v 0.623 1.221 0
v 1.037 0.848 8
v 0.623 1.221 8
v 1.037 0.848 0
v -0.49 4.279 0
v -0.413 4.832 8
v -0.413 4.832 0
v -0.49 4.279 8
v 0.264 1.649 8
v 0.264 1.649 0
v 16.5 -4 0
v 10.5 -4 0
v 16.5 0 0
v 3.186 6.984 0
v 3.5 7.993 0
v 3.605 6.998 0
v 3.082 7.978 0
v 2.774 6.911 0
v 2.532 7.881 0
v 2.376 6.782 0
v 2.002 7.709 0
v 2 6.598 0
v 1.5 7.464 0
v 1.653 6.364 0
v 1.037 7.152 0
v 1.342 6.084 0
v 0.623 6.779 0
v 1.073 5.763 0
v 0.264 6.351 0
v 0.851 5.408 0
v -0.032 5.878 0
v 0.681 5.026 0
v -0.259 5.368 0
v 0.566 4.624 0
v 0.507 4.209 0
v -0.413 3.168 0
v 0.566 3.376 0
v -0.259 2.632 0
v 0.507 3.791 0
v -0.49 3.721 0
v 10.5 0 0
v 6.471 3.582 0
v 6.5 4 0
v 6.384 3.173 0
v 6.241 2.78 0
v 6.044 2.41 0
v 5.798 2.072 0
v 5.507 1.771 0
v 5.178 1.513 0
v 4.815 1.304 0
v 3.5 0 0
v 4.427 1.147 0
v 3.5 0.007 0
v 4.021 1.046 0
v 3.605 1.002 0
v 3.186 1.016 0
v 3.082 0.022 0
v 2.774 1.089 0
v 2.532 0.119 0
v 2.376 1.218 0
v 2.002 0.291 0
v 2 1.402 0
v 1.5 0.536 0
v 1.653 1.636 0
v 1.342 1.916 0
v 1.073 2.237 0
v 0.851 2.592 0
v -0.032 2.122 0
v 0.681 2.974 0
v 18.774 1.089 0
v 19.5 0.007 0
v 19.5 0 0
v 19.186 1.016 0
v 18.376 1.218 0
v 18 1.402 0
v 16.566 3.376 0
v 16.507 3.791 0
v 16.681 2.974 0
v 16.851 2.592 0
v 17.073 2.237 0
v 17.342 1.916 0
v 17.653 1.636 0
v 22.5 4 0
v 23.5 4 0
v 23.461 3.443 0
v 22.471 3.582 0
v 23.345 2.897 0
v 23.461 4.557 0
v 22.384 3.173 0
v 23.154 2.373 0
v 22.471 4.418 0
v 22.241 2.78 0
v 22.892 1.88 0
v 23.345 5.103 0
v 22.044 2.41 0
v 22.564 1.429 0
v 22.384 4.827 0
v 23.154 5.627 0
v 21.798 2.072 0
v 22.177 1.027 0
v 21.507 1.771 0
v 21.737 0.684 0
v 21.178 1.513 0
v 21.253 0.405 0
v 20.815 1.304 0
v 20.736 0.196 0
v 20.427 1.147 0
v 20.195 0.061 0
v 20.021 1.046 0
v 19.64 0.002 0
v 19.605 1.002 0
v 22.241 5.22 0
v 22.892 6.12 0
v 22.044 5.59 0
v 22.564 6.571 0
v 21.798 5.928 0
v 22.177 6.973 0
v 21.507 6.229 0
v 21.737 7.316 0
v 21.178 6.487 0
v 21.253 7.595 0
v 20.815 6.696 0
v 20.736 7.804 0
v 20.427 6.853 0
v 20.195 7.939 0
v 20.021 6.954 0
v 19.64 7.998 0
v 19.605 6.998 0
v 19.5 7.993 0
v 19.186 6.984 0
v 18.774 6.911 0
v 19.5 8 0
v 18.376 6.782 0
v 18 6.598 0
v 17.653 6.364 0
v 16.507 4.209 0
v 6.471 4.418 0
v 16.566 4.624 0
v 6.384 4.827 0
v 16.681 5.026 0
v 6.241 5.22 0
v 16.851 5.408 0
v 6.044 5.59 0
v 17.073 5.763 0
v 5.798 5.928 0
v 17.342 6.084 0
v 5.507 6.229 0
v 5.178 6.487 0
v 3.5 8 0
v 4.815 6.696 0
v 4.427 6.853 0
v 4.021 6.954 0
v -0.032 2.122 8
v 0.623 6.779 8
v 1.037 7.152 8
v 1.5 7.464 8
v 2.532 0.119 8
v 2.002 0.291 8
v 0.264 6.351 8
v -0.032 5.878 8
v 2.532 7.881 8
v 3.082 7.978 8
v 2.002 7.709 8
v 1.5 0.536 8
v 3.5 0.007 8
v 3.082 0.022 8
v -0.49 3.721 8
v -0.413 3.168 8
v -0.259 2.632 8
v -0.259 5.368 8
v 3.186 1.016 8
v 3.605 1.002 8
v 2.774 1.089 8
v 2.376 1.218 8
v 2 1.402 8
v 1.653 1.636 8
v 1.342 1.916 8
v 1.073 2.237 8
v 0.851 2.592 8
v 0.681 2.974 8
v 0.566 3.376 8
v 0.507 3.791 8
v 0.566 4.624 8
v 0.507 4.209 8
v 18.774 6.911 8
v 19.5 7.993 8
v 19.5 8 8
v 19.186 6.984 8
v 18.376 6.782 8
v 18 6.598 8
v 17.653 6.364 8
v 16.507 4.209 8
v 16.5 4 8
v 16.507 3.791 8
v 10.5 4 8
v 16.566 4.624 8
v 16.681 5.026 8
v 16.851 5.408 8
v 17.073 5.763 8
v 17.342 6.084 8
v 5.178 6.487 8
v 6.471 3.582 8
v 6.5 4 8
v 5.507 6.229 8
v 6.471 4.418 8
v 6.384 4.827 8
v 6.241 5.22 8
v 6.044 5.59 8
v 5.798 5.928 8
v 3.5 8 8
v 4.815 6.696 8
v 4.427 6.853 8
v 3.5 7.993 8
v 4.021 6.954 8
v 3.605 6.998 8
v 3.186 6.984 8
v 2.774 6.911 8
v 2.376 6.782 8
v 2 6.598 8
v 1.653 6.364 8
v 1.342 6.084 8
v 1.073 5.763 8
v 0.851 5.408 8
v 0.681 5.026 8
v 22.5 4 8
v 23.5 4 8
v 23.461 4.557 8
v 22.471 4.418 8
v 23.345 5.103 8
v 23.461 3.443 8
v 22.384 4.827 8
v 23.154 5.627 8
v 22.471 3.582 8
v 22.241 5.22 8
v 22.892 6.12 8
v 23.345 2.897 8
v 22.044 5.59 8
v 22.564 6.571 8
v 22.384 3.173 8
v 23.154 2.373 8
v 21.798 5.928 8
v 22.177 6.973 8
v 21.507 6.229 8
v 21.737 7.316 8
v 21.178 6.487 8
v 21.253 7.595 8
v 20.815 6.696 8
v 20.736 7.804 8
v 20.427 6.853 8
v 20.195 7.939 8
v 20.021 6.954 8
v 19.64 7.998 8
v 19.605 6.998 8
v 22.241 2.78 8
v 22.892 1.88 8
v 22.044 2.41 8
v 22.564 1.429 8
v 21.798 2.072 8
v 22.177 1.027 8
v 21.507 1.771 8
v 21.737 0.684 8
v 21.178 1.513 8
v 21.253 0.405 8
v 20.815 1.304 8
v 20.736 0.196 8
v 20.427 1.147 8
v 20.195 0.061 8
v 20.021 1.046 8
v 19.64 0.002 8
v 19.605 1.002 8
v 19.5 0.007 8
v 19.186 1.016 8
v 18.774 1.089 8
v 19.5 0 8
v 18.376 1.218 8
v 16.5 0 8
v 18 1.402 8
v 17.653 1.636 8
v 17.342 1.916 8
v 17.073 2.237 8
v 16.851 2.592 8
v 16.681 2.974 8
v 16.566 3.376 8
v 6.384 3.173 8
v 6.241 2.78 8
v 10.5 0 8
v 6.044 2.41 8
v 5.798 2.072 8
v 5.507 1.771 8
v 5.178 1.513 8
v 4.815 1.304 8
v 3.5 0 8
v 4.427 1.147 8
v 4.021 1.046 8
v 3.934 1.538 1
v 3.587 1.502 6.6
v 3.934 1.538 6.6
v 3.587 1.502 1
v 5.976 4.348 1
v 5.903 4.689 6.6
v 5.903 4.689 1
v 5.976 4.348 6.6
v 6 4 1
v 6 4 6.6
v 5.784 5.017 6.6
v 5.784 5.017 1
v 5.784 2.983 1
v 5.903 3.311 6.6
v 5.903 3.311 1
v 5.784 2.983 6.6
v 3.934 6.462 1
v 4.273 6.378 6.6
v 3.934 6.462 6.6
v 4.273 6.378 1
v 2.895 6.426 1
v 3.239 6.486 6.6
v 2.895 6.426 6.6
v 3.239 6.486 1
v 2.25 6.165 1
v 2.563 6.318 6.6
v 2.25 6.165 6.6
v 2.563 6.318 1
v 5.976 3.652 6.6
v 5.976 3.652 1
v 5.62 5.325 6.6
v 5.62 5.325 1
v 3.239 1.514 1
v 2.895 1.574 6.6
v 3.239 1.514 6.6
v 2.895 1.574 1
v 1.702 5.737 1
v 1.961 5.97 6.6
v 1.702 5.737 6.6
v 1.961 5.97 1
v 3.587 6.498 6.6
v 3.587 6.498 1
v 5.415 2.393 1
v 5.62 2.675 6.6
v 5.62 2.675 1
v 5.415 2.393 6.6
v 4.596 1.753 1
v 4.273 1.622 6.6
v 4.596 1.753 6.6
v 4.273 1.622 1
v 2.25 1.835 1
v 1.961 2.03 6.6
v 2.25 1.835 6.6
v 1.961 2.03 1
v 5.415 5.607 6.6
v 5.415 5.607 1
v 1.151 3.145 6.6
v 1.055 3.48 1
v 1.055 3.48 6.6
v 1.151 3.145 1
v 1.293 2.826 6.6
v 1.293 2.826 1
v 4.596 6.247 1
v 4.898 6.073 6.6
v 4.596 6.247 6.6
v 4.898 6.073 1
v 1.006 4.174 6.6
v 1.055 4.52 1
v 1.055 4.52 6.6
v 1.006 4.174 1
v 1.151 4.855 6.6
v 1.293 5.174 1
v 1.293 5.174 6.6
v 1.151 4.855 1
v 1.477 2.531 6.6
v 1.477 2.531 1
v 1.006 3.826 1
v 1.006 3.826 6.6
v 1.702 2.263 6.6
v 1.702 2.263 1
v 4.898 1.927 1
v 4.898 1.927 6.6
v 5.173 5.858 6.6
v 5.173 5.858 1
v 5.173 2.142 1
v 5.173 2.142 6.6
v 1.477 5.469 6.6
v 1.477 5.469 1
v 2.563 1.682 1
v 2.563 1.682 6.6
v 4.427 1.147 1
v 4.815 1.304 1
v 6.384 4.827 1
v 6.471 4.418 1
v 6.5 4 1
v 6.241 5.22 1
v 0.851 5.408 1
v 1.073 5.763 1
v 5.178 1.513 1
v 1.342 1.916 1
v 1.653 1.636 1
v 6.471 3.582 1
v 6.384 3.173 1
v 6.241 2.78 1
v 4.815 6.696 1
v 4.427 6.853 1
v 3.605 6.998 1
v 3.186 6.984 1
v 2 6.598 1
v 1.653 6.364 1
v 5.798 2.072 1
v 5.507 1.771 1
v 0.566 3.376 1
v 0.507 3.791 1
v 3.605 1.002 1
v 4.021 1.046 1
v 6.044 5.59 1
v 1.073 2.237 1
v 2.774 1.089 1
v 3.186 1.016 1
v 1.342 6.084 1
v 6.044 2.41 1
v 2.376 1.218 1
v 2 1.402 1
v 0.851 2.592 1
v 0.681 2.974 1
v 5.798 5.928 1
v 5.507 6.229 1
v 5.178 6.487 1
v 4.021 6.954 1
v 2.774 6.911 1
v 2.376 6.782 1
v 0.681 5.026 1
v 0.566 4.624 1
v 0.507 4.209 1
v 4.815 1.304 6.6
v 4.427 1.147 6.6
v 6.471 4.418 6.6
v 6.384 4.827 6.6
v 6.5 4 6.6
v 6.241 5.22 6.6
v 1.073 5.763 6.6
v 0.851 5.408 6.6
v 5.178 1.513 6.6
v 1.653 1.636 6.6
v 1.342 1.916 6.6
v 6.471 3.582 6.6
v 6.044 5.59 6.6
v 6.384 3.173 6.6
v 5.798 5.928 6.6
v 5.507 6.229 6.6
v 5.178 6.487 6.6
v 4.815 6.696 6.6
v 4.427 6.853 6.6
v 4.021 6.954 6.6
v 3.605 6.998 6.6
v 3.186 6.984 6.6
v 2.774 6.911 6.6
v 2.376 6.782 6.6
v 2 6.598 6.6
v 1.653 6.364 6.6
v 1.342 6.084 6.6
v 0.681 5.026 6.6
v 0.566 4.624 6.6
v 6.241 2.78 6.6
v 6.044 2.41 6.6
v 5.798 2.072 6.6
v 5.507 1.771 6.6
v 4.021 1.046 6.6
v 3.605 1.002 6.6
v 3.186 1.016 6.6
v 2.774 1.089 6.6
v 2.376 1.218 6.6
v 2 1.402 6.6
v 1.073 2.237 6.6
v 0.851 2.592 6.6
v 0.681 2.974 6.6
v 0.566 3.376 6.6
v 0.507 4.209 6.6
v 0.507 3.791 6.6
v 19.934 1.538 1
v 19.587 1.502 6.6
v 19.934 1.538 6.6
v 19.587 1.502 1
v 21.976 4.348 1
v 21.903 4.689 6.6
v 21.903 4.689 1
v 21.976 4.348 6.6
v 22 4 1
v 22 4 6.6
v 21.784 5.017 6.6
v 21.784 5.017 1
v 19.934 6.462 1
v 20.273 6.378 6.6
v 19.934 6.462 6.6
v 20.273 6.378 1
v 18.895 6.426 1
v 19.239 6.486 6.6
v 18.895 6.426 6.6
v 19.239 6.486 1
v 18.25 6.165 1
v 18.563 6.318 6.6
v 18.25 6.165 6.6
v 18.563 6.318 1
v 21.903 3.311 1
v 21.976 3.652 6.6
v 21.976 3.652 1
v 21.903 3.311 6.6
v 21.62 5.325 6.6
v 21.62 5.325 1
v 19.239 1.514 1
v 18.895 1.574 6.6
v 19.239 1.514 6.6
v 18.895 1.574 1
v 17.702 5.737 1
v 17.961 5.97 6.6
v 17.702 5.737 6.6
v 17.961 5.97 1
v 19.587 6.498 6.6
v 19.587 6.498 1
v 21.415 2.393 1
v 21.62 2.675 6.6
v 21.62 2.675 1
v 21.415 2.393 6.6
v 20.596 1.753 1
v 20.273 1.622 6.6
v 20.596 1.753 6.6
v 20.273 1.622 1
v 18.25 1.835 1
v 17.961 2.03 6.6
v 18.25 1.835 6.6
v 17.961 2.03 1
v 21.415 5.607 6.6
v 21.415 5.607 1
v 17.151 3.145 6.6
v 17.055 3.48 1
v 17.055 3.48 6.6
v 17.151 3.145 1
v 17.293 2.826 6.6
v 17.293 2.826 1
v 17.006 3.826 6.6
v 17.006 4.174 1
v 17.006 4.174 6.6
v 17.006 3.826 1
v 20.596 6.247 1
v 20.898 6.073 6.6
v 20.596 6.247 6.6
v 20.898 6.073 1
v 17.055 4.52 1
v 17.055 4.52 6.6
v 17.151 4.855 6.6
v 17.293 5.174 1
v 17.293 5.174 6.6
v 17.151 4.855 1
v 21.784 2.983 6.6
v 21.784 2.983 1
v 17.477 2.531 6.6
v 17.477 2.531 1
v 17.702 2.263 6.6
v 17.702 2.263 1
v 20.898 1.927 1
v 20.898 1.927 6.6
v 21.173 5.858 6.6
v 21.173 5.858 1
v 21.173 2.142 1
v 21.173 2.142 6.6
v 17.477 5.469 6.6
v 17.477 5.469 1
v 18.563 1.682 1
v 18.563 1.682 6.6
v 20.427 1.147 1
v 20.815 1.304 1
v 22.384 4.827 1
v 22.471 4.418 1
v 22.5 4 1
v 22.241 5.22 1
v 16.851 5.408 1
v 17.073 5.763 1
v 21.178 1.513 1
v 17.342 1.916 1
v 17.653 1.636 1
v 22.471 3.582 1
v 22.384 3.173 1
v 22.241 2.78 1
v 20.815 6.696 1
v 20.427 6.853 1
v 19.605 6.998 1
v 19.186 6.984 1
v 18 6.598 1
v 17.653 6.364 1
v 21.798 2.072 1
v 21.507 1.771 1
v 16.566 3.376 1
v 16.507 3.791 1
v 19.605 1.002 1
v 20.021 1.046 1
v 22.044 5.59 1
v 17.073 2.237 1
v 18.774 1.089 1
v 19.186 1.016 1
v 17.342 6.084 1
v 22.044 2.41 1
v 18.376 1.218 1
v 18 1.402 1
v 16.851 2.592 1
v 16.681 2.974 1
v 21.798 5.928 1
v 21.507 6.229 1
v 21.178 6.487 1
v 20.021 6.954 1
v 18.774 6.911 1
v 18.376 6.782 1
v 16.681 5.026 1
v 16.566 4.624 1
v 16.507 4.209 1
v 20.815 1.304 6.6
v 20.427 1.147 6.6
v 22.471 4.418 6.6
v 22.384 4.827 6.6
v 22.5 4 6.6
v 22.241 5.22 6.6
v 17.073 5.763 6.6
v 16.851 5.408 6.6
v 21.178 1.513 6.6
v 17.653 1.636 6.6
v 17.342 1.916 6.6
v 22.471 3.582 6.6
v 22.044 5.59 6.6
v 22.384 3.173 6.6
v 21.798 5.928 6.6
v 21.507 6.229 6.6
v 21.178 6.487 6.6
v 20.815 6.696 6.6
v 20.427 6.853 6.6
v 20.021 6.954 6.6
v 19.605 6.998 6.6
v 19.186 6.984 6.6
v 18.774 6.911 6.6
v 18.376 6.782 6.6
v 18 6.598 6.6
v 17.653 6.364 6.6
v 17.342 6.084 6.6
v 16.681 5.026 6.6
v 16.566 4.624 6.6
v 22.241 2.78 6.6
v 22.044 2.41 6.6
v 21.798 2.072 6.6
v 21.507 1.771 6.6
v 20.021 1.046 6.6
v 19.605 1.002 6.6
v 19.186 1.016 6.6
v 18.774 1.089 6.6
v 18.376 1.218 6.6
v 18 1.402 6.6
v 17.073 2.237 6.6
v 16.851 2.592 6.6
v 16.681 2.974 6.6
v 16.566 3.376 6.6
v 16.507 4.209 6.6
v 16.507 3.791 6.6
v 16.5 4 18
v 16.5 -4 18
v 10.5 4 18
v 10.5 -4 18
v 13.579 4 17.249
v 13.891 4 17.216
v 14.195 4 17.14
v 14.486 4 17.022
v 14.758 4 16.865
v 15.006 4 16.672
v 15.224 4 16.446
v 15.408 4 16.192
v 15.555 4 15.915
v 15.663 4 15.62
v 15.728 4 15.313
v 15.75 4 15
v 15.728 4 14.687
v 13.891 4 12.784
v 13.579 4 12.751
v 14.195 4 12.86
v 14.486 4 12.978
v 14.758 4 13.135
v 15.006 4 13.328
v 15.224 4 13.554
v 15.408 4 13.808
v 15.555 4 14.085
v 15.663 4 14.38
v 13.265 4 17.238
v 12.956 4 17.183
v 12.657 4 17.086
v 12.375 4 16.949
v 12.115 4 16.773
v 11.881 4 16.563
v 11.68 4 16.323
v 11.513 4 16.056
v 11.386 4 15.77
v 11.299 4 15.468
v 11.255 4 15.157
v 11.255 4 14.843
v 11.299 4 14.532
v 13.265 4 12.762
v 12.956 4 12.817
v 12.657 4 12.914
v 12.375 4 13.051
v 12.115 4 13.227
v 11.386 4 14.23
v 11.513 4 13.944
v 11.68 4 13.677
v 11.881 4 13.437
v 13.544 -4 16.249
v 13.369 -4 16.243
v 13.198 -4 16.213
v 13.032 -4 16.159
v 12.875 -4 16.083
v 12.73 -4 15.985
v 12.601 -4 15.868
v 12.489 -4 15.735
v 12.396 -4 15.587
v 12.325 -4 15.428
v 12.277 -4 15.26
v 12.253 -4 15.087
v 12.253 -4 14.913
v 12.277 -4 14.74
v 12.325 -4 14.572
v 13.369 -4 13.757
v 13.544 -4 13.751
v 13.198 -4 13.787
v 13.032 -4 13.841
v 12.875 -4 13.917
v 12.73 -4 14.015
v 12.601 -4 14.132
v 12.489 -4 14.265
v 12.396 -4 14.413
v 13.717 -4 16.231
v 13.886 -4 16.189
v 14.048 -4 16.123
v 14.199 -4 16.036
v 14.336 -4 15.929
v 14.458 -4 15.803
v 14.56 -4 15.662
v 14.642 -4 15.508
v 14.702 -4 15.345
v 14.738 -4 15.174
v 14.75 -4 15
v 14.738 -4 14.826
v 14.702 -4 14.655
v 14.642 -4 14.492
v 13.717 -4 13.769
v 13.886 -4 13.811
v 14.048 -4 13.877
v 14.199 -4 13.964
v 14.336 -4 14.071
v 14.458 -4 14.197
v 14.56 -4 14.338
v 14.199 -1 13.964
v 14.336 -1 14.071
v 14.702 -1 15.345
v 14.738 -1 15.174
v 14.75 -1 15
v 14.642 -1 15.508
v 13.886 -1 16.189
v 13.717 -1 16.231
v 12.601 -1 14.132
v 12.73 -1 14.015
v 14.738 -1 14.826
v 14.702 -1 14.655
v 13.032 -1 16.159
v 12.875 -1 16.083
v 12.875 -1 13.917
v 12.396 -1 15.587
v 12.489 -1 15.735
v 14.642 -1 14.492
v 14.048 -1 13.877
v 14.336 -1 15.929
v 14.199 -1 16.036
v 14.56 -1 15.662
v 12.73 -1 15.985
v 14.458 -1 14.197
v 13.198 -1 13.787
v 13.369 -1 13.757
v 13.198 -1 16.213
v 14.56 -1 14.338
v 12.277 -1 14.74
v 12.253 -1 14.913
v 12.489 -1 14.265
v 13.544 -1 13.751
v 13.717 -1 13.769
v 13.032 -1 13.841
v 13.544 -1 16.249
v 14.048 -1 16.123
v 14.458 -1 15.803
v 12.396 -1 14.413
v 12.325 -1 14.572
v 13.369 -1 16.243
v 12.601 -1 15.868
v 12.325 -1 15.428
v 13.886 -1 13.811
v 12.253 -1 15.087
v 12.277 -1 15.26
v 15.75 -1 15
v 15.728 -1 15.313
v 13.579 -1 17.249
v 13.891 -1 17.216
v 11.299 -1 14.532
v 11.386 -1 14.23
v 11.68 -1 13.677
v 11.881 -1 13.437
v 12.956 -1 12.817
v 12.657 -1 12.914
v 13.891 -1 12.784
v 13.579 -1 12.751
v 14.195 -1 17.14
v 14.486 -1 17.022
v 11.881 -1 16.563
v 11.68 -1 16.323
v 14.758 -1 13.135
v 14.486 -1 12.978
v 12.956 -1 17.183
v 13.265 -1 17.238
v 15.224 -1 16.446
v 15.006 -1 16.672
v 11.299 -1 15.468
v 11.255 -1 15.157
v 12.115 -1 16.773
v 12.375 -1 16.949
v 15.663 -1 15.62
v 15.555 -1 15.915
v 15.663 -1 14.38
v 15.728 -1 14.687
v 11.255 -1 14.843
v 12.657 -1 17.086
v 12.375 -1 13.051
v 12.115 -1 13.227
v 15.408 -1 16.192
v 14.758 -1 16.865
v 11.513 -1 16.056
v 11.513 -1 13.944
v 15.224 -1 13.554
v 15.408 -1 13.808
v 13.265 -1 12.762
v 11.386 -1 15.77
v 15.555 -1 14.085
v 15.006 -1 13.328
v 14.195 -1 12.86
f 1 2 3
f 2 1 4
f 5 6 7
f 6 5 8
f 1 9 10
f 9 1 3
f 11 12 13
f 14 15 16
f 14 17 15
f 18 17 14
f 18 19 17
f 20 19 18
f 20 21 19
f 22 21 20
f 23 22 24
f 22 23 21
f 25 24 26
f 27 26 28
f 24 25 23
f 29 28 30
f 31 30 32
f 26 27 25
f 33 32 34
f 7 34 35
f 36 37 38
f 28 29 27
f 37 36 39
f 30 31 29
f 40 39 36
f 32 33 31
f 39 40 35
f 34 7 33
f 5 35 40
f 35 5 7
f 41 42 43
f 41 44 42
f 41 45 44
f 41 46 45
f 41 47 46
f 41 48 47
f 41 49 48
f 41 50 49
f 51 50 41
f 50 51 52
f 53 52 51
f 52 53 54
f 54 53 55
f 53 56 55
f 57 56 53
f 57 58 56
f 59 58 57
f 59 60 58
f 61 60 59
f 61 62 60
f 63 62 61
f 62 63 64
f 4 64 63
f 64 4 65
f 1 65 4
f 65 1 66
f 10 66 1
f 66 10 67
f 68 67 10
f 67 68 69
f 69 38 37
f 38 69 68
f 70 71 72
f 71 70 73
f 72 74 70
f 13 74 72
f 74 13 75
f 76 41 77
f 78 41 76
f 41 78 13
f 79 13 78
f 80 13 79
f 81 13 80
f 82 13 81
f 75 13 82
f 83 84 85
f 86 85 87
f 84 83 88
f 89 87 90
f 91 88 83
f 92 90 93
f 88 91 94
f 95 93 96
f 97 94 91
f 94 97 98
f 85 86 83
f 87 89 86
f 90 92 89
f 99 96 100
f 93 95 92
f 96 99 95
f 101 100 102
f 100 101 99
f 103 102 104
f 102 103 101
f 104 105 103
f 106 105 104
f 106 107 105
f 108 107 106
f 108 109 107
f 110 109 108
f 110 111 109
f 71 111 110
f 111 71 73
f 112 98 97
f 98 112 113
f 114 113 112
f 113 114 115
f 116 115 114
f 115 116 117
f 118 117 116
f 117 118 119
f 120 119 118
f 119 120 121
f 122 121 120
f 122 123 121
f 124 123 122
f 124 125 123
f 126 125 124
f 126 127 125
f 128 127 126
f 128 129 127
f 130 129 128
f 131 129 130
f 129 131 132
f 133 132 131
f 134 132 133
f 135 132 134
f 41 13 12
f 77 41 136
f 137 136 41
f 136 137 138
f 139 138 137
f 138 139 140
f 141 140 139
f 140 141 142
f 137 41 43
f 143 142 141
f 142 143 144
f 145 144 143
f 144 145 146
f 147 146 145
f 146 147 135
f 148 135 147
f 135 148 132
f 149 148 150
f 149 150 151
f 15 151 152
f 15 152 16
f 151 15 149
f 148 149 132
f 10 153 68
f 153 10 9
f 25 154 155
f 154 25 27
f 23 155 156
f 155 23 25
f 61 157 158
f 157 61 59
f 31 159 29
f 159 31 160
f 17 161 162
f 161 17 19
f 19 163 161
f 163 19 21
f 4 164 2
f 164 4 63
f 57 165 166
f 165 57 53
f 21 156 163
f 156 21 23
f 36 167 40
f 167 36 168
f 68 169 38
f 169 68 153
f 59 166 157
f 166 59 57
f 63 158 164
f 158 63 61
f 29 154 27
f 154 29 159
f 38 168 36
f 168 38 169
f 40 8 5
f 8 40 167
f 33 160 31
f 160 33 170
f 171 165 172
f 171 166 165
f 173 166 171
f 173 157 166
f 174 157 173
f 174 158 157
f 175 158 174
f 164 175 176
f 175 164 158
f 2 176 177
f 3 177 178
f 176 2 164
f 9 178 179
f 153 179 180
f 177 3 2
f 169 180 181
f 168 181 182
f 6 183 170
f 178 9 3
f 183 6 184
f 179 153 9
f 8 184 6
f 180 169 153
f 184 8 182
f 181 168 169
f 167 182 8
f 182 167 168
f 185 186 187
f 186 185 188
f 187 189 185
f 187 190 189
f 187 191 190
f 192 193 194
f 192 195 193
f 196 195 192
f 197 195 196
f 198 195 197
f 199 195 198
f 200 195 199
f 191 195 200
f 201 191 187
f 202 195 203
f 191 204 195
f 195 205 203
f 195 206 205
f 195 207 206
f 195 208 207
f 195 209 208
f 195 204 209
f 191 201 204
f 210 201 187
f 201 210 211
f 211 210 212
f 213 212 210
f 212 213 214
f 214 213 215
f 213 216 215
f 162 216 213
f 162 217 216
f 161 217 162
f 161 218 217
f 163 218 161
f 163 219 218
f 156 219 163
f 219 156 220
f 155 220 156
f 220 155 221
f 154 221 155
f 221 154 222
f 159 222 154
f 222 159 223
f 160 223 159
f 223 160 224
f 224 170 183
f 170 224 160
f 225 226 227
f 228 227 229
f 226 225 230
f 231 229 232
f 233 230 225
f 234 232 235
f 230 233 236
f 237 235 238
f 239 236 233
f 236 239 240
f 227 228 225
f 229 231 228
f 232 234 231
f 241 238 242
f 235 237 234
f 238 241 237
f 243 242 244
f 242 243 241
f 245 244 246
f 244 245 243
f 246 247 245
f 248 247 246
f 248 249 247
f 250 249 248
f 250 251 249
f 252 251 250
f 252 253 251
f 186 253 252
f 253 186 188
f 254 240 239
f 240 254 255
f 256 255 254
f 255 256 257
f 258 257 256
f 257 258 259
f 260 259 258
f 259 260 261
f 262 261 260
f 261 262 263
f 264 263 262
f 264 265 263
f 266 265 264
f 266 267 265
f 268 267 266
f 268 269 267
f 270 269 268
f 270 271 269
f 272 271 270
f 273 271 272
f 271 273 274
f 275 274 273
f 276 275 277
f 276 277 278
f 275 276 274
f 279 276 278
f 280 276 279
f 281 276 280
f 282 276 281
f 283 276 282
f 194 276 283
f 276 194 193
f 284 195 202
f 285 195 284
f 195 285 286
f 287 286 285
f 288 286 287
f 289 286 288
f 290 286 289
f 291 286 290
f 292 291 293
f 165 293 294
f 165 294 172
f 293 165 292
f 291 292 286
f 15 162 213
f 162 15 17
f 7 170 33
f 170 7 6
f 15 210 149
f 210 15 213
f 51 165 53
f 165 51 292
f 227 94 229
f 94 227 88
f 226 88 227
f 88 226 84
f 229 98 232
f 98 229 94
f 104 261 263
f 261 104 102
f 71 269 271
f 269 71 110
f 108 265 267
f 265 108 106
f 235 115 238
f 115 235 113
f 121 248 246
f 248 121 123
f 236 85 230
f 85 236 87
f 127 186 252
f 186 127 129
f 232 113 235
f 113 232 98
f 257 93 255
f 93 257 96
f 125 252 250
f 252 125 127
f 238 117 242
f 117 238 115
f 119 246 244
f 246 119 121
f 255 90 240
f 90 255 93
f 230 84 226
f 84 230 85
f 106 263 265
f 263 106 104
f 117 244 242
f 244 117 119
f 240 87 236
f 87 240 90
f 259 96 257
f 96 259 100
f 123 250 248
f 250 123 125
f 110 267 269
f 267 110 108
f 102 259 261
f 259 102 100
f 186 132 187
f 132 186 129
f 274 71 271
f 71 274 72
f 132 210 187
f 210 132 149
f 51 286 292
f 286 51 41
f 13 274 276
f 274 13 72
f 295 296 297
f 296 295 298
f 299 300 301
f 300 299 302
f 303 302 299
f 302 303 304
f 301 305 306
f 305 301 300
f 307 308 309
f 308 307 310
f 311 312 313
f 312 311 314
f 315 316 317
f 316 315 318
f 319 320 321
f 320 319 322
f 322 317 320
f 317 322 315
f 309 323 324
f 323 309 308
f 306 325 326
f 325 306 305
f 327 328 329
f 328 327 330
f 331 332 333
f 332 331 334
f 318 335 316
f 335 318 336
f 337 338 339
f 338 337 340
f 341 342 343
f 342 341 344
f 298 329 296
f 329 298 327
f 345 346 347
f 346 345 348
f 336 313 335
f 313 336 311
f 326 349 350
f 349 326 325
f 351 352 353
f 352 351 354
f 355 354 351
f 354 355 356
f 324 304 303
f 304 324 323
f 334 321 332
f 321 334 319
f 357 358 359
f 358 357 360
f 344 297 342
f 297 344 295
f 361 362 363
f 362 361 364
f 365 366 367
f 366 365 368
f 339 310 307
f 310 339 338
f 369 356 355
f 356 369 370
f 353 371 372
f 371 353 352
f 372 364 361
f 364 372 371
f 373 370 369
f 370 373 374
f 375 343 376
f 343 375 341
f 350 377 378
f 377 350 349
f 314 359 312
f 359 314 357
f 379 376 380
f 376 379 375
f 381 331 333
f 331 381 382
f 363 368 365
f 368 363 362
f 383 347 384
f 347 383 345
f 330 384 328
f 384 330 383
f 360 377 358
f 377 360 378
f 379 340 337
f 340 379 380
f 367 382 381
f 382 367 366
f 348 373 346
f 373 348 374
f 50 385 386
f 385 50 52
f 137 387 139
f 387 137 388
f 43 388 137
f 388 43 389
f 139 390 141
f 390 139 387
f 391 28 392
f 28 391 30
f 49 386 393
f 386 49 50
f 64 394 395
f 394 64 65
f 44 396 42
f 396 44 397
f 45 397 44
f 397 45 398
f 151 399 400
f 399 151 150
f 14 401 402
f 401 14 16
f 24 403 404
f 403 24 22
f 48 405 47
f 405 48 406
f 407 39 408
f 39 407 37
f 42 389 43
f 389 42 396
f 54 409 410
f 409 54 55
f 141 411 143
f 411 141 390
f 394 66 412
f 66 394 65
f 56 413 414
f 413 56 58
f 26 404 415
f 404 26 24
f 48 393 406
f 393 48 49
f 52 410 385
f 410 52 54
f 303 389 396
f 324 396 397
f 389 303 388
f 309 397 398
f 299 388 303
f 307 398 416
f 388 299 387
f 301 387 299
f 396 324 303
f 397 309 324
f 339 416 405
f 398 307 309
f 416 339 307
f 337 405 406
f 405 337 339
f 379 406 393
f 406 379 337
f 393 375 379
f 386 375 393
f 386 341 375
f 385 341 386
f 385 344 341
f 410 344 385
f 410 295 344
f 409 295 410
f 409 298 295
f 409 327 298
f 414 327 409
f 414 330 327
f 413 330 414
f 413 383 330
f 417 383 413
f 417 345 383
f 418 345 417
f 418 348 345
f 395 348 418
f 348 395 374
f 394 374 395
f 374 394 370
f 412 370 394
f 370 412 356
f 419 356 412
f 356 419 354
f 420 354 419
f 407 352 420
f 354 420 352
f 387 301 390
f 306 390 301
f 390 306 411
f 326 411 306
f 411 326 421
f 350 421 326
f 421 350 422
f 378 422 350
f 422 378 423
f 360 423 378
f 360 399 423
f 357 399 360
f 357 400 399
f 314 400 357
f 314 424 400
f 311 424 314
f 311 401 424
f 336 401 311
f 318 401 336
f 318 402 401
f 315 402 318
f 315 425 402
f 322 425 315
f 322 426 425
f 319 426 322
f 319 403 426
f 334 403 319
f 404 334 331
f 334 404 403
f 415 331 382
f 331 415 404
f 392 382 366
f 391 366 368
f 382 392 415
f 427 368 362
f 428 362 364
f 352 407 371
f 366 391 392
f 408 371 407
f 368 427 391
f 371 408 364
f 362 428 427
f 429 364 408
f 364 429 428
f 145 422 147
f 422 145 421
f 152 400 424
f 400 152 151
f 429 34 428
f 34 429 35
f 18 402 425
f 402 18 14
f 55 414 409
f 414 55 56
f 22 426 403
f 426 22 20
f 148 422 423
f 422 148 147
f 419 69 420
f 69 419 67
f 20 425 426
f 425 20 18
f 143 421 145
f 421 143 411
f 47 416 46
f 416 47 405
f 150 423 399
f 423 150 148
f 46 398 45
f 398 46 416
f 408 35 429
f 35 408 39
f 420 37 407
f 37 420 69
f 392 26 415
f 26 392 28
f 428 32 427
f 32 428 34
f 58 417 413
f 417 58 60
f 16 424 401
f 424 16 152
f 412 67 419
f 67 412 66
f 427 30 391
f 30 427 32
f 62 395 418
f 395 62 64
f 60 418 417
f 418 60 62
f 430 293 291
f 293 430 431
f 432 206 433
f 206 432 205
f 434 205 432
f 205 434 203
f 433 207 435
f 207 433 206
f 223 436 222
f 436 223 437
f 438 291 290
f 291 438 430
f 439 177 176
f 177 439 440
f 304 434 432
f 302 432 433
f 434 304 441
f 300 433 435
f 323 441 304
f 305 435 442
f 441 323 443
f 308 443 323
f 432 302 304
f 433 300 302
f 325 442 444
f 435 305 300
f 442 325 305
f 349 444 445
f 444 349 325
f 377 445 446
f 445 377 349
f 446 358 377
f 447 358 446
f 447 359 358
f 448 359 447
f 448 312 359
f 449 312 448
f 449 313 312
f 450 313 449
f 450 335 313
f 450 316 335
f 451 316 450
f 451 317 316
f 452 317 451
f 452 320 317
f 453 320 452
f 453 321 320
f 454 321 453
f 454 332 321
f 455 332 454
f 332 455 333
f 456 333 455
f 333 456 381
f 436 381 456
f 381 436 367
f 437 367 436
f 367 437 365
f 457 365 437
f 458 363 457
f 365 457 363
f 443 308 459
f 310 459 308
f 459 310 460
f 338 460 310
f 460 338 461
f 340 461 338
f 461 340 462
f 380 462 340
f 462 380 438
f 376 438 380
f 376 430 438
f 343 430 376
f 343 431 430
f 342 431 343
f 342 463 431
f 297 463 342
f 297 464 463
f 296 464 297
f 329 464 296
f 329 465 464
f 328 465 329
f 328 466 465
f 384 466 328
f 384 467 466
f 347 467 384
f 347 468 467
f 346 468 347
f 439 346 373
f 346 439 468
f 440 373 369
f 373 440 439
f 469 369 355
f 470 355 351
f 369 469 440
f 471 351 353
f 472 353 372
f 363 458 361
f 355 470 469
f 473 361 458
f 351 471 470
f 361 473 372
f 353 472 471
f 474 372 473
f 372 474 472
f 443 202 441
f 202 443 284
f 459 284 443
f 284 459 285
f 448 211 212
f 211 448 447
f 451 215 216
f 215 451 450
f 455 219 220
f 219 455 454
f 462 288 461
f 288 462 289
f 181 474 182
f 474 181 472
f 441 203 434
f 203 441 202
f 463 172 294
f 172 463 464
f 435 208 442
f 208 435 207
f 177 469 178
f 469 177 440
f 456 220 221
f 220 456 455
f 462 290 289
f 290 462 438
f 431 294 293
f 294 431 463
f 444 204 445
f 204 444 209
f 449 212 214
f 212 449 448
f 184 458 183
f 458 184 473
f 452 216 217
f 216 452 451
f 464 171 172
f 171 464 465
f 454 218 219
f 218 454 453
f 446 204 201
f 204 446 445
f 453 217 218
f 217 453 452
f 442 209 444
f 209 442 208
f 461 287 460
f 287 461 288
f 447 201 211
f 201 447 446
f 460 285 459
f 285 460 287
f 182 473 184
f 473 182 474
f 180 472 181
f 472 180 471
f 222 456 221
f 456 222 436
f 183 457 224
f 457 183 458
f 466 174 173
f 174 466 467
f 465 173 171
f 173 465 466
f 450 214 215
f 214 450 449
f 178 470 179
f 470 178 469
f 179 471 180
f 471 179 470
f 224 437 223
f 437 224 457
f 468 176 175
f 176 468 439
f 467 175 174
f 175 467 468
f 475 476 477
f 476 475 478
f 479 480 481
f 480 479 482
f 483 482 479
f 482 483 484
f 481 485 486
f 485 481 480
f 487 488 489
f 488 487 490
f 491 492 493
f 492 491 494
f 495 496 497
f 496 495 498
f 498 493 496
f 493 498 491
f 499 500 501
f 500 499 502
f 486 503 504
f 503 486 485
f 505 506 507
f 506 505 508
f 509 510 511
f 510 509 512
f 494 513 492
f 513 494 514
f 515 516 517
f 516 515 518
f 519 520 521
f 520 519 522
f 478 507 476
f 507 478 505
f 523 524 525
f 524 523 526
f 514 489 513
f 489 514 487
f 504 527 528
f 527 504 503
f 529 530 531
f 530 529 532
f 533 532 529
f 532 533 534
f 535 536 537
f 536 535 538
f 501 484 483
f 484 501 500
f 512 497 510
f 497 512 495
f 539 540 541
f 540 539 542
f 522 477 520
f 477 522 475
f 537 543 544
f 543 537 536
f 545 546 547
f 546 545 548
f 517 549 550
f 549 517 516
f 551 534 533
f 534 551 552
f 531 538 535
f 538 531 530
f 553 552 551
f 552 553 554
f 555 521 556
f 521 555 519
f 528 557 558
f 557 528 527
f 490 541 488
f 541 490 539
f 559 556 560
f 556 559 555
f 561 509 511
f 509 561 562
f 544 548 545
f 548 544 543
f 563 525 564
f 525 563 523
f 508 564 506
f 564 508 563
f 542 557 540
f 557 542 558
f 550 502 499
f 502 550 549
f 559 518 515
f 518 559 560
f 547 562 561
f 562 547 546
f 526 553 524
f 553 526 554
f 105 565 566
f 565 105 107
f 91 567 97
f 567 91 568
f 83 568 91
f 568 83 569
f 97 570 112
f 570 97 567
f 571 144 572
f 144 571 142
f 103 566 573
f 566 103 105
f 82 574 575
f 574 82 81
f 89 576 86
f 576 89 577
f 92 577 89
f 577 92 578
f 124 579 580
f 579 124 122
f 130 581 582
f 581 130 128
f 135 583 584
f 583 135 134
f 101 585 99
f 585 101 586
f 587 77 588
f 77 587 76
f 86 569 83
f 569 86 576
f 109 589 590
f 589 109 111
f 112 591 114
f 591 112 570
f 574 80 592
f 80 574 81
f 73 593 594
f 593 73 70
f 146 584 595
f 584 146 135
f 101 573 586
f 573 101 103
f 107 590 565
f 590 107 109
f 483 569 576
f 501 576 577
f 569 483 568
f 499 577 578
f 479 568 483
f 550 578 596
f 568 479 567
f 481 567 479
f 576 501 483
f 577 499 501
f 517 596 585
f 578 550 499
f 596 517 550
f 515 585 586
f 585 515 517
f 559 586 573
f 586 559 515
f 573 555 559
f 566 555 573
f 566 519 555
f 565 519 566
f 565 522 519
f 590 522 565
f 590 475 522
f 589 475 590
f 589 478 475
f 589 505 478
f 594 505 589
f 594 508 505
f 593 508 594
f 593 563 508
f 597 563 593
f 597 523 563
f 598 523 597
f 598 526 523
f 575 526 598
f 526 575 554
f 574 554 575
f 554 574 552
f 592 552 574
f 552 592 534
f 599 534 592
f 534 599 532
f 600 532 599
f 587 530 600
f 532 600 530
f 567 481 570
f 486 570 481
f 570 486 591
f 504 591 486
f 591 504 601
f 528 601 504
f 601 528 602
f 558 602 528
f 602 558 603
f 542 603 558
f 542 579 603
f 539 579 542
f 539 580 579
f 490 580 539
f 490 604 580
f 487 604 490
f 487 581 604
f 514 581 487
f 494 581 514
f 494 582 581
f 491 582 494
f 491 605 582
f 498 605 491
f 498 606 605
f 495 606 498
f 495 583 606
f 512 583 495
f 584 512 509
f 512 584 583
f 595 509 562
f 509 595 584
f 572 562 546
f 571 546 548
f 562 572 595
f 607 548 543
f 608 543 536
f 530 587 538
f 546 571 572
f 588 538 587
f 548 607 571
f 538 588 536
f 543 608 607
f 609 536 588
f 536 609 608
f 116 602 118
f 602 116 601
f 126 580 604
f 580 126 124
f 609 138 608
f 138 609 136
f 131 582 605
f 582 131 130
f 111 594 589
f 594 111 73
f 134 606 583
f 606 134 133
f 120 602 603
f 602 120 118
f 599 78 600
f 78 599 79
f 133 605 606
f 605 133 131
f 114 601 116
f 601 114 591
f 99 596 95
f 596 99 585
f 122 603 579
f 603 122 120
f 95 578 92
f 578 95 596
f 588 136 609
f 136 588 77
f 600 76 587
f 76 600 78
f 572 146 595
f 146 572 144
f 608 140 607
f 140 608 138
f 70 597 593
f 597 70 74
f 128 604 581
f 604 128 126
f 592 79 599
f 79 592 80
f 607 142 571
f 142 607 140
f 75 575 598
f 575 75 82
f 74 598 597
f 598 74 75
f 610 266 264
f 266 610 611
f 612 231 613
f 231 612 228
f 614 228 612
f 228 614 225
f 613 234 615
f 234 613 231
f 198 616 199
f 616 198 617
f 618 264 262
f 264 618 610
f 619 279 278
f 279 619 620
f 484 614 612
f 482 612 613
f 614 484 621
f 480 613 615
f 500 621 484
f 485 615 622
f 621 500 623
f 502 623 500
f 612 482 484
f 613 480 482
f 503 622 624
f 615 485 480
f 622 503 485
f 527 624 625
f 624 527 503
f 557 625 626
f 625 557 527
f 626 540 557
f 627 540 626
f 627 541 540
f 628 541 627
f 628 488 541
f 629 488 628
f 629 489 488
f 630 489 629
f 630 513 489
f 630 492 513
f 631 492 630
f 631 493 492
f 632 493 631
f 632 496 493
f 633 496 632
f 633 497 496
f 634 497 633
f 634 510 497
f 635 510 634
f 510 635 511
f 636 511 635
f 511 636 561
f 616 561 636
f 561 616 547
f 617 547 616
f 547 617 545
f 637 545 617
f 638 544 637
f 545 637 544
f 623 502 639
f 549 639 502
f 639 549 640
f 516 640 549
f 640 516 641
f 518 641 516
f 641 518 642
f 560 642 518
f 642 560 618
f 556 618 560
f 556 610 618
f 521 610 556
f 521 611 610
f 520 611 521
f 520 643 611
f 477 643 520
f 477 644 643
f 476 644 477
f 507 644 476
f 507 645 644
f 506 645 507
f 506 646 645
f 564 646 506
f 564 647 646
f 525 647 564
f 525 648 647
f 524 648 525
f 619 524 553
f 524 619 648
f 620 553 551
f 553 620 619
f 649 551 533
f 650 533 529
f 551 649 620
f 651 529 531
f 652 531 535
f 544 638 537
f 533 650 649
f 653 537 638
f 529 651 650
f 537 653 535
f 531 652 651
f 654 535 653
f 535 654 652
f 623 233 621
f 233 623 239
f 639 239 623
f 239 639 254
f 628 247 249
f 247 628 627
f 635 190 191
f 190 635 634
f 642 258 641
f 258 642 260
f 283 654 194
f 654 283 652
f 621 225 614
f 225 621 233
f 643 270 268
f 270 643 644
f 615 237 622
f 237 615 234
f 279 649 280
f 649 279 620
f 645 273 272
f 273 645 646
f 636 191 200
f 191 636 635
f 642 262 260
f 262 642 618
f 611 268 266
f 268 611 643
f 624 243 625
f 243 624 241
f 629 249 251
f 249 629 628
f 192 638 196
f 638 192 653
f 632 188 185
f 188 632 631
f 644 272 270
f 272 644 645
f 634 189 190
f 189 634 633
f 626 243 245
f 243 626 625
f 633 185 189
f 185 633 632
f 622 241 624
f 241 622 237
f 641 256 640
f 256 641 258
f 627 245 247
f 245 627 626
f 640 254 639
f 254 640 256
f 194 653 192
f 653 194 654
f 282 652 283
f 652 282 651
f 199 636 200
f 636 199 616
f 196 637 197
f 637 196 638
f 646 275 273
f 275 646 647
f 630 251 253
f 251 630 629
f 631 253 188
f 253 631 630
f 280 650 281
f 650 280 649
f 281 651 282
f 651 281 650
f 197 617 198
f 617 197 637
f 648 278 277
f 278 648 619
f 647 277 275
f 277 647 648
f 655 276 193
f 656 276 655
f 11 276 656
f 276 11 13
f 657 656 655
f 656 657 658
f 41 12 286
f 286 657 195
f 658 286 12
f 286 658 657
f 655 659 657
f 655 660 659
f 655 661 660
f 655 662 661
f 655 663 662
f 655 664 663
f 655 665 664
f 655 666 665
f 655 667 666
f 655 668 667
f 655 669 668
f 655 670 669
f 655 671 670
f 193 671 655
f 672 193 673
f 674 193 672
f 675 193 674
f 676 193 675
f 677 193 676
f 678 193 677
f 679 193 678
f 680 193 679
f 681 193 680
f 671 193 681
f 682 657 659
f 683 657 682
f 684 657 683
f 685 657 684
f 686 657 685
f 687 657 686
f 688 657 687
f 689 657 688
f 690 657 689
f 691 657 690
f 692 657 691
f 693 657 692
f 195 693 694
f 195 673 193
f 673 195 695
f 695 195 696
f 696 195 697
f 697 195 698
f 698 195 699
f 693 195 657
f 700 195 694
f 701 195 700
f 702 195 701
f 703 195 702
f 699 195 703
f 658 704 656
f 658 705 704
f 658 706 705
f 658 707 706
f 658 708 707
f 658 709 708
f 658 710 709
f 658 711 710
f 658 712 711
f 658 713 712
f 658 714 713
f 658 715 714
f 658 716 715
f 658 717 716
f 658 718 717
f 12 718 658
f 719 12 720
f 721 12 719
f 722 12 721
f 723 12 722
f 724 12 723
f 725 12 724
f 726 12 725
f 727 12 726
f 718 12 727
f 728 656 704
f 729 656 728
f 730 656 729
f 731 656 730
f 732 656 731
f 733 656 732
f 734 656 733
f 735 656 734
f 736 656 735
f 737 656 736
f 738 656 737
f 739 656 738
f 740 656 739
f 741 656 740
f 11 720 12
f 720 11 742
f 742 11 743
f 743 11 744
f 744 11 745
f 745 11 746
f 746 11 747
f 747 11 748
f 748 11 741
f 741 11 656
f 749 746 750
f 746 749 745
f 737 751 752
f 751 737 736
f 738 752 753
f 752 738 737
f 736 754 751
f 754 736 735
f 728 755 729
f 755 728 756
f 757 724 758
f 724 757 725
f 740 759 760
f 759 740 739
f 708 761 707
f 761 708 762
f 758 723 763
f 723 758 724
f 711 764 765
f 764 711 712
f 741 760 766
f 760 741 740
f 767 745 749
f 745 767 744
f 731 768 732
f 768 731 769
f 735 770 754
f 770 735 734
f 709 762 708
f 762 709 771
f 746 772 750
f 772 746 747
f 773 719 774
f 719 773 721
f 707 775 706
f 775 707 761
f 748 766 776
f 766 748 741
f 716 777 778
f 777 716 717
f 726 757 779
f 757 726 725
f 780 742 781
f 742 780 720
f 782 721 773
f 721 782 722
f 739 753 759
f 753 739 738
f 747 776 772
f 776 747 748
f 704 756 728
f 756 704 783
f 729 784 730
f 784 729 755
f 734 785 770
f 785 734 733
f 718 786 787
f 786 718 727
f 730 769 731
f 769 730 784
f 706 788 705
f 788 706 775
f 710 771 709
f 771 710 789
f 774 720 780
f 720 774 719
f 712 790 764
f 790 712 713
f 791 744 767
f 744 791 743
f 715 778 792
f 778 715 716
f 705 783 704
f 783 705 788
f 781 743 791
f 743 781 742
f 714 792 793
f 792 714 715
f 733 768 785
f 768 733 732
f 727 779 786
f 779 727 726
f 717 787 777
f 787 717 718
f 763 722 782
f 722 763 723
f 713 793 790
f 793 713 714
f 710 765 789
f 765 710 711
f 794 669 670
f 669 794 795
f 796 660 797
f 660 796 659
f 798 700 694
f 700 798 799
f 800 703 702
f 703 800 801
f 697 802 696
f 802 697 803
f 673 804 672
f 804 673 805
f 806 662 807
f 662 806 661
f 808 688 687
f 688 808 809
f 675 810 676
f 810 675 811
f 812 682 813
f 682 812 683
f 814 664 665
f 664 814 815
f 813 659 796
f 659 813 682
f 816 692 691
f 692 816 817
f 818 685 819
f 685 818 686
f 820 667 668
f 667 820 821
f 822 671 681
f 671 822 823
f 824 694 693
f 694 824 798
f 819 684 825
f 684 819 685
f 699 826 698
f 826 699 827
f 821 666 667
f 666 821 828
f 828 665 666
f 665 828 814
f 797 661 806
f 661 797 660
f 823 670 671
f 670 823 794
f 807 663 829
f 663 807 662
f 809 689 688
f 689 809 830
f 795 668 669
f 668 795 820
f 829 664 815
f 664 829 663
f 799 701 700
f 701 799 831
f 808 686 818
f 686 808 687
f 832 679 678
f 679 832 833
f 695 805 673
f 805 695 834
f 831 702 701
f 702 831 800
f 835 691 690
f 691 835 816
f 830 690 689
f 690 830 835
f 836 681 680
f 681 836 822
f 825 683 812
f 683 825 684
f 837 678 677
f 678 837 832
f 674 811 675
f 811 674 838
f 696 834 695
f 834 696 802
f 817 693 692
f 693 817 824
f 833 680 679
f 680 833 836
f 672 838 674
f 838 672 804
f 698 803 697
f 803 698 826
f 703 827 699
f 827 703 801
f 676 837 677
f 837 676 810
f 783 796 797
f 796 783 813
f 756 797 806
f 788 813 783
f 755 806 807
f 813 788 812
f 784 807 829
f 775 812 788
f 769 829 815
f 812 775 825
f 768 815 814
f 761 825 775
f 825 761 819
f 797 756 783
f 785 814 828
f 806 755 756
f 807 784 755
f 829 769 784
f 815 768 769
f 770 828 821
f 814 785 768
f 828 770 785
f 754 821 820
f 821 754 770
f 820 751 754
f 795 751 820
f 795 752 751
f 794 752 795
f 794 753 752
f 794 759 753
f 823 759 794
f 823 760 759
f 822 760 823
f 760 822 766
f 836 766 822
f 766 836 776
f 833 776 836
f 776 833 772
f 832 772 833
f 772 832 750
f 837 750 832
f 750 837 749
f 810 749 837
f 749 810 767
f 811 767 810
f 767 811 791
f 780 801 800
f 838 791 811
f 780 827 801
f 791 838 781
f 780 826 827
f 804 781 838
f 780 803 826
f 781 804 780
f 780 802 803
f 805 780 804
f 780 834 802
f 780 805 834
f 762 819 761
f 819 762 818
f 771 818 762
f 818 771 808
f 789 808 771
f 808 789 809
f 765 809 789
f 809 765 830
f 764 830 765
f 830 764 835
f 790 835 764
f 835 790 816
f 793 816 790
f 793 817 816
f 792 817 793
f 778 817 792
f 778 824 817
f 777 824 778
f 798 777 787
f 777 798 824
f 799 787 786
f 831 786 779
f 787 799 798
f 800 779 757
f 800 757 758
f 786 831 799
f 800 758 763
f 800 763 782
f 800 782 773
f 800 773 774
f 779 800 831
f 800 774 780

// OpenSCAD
$fn = 45;

atomMount();

module atomMount() {
    difference() {
        translate([0, 0, 0]) {
            translate([3.5, 0, 0]) cube([16, 8, 8]);
            translate([3.5, 4, 0]) {
                difference() {
                    cylinder(d = 8, h = 8);
                    translate([0, -5, 0]) cube([9, 9, 9]);
                }
            }
            translate([19.5, 4, 0]) {
                difference() {
                    cylinder(d = 8, h = 8);
                    translate([0, 5, 0]) cube([9, 9, 9]);
                }
            }
        }
        translate([3.5, 4, -0.5]) {
            cylinder(d = 5, h = 9);
            cylinder(d = 6, h = 1.5);
            translate([0, 0, 7.1]) cylinder(d = 6, h = 1.5);
        }
        translate([19.5, 4, -0.5]) {
            cylinder(d = 5, h = 9);
            cylinder(d = 6, h = 1.5);
            translate([0, 0, 7.1]) cylinder(d = 6, h = 1.5);
        }
    }
    translate([10.5, -4, 0]) {
        difference() {
            cube([6, 8, 18]);
            translate([3, 9, 15]) rotate([90, 0, 0]) cylinder(d = 2.5, h = 20);
            translate([3, 9, 15]) rotate([90, 0, 0]) cylinder(d = 4.5, h = 6);
        }
    }
    
}
